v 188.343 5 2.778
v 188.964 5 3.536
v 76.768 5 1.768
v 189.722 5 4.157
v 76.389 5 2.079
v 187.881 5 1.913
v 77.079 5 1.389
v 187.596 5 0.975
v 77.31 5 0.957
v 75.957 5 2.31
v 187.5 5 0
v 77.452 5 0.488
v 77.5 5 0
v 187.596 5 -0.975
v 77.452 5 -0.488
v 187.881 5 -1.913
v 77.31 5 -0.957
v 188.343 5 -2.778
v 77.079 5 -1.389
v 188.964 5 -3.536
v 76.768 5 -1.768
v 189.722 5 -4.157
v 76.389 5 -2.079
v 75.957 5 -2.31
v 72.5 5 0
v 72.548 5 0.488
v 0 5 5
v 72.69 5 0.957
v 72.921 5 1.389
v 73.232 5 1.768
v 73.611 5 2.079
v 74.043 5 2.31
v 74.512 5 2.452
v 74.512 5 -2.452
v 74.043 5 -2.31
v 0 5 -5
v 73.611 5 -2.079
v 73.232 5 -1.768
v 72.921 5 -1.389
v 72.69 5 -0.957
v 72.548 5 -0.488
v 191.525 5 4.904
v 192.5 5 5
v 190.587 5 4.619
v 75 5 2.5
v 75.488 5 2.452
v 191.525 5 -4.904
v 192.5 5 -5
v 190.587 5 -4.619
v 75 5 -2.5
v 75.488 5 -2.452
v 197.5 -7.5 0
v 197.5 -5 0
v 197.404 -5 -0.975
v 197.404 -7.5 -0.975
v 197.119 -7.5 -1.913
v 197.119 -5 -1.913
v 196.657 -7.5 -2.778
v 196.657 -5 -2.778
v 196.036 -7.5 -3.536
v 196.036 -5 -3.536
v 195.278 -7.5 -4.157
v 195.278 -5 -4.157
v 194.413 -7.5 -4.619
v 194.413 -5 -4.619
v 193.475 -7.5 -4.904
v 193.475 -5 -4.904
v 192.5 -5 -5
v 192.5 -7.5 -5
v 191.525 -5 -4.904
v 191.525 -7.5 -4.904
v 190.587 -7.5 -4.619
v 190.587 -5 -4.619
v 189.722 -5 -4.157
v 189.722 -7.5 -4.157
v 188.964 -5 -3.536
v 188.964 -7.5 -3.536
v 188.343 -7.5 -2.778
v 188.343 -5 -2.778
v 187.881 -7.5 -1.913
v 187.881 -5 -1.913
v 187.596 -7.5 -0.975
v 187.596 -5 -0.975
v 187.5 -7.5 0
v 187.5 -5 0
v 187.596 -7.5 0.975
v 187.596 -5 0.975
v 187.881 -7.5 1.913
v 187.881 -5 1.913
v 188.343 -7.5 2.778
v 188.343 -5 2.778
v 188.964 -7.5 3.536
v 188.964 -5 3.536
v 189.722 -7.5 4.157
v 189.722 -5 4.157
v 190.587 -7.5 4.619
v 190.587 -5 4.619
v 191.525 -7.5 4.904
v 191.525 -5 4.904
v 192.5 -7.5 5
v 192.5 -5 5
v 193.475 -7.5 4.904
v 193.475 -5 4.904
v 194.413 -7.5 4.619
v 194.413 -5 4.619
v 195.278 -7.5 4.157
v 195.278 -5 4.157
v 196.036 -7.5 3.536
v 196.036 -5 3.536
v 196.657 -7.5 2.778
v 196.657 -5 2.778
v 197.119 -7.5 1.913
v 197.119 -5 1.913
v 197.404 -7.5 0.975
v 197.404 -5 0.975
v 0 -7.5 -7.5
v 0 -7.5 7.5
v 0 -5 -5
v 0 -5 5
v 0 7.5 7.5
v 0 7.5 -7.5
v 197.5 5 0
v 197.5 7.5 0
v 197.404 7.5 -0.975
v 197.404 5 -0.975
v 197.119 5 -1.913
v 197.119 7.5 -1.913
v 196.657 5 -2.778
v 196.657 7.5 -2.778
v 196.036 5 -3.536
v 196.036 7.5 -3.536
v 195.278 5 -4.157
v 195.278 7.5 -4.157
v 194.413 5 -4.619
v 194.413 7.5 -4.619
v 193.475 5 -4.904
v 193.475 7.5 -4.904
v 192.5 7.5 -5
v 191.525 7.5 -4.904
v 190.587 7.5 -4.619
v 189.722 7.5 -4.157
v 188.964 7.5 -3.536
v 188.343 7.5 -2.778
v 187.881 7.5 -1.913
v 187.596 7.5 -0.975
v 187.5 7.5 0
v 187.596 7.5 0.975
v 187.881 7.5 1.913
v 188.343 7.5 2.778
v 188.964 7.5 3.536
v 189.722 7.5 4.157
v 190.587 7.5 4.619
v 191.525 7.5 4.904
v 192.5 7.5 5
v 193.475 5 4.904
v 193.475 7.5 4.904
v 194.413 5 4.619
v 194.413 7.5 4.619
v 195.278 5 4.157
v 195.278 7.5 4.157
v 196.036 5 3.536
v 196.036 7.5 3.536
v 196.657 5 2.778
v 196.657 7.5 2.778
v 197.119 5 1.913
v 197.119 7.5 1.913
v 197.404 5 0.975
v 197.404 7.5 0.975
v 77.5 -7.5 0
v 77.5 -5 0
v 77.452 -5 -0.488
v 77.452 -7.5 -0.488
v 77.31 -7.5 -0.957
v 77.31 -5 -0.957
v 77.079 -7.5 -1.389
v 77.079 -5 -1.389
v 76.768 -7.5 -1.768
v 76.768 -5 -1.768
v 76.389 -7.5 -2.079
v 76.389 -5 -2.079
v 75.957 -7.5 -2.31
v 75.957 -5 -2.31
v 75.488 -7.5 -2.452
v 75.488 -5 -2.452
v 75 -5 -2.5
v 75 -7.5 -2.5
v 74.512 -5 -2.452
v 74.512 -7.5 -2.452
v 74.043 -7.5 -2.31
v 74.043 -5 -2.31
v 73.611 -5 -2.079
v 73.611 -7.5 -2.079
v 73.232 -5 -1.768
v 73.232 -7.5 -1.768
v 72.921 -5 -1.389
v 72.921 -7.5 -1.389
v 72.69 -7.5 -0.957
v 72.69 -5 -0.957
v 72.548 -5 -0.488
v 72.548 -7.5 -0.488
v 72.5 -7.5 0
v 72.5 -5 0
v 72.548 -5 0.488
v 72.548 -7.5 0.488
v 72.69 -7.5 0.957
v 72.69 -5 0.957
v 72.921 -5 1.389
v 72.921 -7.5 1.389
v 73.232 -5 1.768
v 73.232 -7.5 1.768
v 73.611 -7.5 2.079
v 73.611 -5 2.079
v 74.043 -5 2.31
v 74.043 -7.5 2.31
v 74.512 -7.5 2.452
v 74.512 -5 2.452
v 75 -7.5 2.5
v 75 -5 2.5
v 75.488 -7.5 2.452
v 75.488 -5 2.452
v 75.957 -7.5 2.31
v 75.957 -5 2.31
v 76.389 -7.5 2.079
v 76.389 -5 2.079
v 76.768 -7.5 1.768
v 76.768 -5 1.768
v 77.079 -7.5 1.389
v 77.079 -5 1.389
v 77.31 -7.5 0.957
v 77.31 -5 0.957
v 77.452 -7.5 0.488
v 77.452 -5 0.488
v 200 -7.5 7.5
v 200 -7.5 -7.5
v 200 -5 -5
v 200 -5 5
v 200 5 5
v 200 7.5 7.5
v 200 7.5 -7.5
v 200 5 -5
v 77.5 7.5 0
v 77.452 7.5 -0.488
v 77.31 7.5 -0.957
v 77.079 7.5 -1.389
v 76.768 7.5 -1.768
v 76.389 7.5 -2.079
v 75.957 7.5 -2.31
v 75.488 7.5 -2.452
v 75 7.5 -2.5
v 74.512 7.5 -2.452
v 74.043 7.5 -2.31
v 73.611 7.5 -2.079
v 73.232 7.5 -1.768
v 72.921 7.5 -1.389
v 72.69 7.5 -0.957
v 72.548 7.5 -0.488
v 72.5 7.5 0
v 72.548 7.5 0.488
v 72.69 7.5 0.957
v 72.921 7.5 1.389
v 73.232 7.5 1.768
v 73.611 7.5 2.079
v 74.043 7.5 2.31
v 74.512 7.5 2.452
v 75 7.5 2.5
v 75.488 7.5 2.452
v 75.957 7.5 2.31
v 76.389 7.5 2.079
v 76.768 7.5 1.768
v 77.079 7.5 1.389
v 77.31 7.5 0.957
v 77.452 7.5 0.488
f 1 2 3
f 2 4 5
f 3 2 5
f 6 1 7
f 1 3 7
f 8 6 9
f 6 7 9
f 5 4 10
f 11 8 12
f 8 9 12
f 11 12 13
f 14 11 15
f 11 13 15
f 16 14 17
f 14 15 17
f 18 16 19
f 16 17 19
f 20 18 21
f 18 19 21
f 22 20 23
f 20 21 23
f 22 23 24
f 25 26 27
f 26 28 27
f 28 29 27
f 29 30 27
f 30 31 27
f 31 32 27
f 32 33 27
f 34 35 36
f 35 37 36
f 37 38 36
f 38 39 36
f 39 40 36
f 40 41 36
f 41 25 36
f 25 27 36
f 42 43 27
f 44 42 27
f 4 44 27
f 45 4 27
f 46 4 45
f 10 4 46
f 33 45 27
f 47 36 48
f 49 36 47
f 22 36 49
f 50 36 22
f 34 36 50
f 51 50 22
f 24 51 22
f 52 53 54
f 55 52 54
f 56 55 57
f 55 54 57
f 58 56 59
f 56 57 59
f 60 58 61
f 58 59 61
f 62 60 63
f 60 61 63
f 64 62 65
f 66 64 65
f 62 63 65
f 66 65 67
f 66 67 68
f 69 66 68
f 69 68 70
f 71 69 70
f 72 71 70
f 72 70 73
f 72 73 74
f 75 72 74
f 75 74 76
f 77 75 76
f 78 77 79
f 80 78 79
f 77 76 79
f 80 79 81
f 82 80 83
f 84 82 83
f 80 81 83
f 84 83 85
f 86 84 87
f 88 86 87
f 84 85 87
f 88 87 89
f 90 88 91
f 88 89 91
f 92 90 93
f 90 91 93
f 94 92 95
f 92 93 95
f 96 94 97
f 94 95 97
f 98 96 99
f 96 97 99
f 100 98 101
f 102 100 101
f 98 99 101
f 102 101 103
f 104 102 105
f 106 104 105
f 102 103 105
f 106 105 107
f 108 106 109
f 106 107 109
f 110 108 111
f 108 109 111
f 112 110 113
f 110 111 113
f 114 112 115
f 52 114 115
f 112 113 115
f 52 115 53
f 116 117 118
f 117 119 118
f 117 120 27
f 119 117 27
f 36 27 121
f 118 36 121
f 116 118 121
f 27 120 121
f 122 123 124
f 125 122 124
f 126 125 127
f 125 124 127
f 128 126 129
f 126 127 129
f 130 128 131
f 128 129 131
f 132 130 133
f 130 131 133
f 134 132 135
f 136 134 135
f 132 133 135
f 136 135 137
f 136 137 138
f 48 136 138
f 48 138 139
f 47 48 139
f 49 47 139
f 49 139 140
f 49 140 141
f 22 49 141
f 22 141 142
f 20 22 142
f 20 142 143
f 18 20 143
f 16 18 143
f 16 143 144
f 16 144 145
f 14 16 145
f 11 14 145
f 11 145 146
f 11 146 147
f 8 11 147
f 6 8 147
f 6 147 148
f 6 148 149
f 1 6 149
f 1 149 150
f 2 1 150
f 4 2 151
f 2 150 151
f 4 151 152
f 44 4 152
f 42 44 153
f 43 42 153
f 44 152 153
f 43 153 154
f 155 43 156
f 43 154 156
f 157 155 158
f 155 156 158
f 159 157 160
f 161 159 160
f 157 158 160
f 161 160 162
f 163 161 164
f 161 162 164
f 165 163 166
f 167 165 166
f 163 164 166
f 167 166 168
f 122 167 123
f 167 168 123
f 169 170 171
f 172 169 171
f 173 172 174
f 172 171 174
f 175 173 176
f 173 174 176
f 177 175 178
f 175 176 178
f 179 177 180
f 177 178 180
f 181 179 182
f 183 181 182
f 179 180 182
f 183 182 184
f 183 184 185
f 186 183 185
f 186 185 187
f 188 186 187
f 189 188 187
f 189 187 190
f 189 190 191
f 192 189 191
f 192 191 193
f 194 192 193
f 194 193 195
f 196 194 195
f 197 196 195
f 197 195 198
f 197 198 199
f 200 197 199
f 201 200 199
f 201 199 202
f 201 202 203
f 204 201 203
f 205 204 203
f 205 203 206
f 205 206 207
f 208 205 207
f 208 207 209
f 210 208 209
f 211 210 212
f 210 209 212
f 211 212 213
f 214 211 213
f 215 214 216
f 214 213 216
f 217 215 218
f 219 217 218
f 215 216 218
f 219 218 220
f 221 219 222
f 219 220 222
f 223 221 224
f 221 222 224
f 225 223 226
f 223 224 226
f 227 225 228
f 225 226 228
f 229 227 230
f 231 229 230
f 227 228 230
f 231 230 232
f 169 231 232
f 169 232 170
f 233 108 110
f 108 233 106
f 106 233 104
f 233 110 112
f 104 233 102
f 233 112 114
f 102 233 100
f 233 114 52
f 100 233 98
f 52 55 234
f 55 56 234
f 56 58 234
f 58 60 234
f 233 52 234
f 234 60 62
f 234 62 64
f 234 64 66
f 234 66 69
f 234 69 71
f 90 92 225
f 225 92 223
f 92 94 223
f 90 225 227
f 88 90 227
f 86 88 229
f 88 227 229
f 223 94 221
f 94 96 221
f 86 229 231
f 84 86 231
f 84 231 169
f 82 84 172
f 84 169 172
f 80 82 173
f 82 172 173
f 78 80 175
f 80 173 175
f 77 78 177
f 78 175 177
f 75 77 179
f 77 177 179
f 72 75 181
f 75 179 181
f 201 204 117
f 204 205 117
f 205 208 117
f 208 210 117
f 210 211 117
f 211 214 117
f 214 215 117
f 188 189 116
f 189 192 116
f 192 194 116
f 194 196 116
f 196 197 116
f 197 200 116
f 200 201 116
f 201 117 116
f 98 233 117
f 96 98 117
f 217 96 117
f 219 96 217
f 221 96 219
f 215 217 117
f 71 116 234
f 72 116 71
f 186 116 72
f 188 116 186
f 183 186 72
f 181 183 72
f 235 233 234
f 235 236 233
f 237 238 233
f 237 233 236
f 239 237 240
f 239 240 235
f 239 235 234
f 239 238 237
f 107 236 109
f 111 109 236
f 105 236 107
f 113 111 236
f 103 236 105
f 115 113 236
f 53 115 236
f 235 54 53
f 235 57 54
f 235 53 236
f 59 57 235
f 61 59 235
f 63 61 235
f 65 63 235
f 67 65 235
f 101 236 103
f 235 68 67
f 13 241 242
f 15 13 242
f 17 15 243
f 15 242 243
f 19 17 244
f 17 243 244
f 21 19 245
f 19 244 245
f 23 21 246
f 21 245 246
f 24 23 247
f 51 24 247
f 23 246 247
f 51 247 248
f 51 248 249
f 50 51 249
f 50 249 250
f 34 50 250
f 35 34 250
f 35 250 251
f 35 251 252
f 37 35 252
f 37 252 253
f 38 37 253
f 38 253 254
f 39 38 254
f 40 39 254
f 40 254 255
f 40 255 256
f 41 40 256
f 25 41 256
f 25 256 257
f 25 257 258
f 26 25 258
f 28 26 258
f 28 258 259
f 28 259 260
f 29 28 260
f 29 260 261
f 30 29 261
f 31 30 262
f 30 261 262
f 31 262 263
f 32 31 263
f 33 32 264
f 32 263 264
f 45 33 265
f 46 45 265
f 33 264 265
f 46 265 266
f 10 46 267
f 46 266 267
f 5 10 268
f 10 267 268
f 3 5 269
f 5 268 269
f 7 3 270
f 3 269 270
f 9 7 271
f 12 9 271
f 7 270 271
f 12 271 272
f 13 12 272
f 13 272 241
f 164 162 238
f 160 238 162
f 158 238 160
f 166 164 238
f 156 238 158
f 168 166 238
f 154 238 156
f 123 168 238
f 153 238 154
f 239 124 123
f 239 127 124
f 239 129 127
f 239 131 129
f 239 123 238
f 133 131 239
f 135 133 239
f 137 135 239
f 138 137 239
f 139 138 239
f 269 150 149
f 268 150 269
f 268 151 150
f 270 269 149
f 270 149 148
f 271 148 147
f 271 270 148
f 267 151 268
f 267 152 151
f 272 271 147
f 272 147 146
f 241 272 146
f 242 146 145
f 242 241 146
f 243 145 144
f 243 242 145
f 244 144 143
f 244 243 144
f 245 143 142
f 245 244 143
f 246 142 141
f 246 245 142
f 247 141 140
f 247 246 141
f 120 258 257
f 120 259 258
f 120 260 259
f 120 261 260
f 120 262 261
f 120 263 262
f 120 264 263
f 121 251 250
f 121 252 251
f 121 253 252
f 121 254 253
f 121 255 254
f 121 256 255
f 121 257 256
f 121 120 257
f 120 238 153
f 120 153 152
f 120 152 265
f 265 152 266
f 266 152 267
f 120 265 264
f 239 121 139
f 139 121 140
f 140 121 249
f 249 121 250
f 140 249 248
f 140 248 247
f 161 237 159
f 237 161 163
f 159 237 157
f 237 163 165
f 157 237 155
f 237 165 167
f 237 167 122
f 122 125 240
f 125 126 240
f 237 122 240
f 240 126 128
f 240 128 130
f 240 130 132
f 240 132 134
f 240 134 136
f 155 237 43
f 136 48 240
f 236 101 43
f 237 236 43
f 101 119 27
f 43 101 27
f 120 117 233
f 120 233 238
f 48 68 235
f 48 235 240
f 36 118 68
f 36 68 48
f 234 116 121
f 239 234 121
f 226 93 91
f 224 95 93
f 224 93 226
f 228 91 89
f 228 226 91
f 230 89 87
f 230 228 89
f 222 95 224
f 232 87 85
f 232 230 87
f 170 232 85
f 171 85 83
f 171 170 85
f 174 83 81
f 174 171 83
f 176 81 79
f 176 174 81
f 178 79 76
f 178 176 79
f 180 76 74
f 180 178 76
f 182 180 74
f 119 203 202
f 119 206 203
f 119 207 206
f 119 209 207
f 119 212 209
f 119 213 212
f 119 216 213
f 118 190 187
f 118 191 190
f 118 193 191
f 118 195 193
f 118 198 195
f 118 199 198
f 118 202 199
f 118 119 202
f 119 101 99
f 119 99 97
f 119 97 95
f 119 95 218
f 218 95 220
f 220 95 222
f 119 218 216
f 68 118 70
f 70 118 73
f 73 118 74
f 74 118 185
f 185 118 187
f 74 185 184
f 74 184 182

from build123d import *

# Parameters (mm, degrees)
SKETCH1_W           = 15
SKETCH1_H           = 15
SKETCH1_W_2         = 10
SKETCH1_H_2         = 10
BOSS_EXTRUDE1_DEPTH = 200
SKETCH2_R           = 5
CUT_EXTRUDE1_DEPTH  = 16
SKETCH3_R           = 2.5
CUT_EXTRUDE2_DEPTH  = 100


with BuildPart() as part:
    # Sketch1 → Boss-Extrude1 (new body)
    with BuildSketch(Plane(origin=(0, 0, 0), x_dir=(0, 0, -1), z_dir=(1, 0, 0))):
        Rectangle(SKETCH1_W, SKETCH1_H)
        Rectangle(SKETCH1_W_2, SKETCH1_H_2, mode=Mode.SUBTRACT)
    extrude(amount=BOSS_EXTRUDE1_DEPTH)

    # Sketch2 → Cut-Extrude1 (cut, through all)
    with BuildSketch(Plane(origin=(0, 7.5, 0), x_dir=(1, 0, 0), z_dir=(0, 1, 0))):
        with Locations((192.5, 0)):
            Circle(SKETCH2_R)
    extrude(amount=-CUT_EXTRUDE1_DEPTH, mode=Mode.SUBTRACT)

    # Sketch3 → Cut-Extrude2 (cut)
    with BuildSketch(Plane(origin=(0, 7.5, 0), x_dir=(1, 0, 0), z_dir=(0, 1, 0))):
        with Locations((75, 0)):
            Circle(SKETCH3_R)
    extrude(amount=-CUT_EXTRUDE2_DEPTH, mode=Mode.SUBTRACT)


solid = part.part
